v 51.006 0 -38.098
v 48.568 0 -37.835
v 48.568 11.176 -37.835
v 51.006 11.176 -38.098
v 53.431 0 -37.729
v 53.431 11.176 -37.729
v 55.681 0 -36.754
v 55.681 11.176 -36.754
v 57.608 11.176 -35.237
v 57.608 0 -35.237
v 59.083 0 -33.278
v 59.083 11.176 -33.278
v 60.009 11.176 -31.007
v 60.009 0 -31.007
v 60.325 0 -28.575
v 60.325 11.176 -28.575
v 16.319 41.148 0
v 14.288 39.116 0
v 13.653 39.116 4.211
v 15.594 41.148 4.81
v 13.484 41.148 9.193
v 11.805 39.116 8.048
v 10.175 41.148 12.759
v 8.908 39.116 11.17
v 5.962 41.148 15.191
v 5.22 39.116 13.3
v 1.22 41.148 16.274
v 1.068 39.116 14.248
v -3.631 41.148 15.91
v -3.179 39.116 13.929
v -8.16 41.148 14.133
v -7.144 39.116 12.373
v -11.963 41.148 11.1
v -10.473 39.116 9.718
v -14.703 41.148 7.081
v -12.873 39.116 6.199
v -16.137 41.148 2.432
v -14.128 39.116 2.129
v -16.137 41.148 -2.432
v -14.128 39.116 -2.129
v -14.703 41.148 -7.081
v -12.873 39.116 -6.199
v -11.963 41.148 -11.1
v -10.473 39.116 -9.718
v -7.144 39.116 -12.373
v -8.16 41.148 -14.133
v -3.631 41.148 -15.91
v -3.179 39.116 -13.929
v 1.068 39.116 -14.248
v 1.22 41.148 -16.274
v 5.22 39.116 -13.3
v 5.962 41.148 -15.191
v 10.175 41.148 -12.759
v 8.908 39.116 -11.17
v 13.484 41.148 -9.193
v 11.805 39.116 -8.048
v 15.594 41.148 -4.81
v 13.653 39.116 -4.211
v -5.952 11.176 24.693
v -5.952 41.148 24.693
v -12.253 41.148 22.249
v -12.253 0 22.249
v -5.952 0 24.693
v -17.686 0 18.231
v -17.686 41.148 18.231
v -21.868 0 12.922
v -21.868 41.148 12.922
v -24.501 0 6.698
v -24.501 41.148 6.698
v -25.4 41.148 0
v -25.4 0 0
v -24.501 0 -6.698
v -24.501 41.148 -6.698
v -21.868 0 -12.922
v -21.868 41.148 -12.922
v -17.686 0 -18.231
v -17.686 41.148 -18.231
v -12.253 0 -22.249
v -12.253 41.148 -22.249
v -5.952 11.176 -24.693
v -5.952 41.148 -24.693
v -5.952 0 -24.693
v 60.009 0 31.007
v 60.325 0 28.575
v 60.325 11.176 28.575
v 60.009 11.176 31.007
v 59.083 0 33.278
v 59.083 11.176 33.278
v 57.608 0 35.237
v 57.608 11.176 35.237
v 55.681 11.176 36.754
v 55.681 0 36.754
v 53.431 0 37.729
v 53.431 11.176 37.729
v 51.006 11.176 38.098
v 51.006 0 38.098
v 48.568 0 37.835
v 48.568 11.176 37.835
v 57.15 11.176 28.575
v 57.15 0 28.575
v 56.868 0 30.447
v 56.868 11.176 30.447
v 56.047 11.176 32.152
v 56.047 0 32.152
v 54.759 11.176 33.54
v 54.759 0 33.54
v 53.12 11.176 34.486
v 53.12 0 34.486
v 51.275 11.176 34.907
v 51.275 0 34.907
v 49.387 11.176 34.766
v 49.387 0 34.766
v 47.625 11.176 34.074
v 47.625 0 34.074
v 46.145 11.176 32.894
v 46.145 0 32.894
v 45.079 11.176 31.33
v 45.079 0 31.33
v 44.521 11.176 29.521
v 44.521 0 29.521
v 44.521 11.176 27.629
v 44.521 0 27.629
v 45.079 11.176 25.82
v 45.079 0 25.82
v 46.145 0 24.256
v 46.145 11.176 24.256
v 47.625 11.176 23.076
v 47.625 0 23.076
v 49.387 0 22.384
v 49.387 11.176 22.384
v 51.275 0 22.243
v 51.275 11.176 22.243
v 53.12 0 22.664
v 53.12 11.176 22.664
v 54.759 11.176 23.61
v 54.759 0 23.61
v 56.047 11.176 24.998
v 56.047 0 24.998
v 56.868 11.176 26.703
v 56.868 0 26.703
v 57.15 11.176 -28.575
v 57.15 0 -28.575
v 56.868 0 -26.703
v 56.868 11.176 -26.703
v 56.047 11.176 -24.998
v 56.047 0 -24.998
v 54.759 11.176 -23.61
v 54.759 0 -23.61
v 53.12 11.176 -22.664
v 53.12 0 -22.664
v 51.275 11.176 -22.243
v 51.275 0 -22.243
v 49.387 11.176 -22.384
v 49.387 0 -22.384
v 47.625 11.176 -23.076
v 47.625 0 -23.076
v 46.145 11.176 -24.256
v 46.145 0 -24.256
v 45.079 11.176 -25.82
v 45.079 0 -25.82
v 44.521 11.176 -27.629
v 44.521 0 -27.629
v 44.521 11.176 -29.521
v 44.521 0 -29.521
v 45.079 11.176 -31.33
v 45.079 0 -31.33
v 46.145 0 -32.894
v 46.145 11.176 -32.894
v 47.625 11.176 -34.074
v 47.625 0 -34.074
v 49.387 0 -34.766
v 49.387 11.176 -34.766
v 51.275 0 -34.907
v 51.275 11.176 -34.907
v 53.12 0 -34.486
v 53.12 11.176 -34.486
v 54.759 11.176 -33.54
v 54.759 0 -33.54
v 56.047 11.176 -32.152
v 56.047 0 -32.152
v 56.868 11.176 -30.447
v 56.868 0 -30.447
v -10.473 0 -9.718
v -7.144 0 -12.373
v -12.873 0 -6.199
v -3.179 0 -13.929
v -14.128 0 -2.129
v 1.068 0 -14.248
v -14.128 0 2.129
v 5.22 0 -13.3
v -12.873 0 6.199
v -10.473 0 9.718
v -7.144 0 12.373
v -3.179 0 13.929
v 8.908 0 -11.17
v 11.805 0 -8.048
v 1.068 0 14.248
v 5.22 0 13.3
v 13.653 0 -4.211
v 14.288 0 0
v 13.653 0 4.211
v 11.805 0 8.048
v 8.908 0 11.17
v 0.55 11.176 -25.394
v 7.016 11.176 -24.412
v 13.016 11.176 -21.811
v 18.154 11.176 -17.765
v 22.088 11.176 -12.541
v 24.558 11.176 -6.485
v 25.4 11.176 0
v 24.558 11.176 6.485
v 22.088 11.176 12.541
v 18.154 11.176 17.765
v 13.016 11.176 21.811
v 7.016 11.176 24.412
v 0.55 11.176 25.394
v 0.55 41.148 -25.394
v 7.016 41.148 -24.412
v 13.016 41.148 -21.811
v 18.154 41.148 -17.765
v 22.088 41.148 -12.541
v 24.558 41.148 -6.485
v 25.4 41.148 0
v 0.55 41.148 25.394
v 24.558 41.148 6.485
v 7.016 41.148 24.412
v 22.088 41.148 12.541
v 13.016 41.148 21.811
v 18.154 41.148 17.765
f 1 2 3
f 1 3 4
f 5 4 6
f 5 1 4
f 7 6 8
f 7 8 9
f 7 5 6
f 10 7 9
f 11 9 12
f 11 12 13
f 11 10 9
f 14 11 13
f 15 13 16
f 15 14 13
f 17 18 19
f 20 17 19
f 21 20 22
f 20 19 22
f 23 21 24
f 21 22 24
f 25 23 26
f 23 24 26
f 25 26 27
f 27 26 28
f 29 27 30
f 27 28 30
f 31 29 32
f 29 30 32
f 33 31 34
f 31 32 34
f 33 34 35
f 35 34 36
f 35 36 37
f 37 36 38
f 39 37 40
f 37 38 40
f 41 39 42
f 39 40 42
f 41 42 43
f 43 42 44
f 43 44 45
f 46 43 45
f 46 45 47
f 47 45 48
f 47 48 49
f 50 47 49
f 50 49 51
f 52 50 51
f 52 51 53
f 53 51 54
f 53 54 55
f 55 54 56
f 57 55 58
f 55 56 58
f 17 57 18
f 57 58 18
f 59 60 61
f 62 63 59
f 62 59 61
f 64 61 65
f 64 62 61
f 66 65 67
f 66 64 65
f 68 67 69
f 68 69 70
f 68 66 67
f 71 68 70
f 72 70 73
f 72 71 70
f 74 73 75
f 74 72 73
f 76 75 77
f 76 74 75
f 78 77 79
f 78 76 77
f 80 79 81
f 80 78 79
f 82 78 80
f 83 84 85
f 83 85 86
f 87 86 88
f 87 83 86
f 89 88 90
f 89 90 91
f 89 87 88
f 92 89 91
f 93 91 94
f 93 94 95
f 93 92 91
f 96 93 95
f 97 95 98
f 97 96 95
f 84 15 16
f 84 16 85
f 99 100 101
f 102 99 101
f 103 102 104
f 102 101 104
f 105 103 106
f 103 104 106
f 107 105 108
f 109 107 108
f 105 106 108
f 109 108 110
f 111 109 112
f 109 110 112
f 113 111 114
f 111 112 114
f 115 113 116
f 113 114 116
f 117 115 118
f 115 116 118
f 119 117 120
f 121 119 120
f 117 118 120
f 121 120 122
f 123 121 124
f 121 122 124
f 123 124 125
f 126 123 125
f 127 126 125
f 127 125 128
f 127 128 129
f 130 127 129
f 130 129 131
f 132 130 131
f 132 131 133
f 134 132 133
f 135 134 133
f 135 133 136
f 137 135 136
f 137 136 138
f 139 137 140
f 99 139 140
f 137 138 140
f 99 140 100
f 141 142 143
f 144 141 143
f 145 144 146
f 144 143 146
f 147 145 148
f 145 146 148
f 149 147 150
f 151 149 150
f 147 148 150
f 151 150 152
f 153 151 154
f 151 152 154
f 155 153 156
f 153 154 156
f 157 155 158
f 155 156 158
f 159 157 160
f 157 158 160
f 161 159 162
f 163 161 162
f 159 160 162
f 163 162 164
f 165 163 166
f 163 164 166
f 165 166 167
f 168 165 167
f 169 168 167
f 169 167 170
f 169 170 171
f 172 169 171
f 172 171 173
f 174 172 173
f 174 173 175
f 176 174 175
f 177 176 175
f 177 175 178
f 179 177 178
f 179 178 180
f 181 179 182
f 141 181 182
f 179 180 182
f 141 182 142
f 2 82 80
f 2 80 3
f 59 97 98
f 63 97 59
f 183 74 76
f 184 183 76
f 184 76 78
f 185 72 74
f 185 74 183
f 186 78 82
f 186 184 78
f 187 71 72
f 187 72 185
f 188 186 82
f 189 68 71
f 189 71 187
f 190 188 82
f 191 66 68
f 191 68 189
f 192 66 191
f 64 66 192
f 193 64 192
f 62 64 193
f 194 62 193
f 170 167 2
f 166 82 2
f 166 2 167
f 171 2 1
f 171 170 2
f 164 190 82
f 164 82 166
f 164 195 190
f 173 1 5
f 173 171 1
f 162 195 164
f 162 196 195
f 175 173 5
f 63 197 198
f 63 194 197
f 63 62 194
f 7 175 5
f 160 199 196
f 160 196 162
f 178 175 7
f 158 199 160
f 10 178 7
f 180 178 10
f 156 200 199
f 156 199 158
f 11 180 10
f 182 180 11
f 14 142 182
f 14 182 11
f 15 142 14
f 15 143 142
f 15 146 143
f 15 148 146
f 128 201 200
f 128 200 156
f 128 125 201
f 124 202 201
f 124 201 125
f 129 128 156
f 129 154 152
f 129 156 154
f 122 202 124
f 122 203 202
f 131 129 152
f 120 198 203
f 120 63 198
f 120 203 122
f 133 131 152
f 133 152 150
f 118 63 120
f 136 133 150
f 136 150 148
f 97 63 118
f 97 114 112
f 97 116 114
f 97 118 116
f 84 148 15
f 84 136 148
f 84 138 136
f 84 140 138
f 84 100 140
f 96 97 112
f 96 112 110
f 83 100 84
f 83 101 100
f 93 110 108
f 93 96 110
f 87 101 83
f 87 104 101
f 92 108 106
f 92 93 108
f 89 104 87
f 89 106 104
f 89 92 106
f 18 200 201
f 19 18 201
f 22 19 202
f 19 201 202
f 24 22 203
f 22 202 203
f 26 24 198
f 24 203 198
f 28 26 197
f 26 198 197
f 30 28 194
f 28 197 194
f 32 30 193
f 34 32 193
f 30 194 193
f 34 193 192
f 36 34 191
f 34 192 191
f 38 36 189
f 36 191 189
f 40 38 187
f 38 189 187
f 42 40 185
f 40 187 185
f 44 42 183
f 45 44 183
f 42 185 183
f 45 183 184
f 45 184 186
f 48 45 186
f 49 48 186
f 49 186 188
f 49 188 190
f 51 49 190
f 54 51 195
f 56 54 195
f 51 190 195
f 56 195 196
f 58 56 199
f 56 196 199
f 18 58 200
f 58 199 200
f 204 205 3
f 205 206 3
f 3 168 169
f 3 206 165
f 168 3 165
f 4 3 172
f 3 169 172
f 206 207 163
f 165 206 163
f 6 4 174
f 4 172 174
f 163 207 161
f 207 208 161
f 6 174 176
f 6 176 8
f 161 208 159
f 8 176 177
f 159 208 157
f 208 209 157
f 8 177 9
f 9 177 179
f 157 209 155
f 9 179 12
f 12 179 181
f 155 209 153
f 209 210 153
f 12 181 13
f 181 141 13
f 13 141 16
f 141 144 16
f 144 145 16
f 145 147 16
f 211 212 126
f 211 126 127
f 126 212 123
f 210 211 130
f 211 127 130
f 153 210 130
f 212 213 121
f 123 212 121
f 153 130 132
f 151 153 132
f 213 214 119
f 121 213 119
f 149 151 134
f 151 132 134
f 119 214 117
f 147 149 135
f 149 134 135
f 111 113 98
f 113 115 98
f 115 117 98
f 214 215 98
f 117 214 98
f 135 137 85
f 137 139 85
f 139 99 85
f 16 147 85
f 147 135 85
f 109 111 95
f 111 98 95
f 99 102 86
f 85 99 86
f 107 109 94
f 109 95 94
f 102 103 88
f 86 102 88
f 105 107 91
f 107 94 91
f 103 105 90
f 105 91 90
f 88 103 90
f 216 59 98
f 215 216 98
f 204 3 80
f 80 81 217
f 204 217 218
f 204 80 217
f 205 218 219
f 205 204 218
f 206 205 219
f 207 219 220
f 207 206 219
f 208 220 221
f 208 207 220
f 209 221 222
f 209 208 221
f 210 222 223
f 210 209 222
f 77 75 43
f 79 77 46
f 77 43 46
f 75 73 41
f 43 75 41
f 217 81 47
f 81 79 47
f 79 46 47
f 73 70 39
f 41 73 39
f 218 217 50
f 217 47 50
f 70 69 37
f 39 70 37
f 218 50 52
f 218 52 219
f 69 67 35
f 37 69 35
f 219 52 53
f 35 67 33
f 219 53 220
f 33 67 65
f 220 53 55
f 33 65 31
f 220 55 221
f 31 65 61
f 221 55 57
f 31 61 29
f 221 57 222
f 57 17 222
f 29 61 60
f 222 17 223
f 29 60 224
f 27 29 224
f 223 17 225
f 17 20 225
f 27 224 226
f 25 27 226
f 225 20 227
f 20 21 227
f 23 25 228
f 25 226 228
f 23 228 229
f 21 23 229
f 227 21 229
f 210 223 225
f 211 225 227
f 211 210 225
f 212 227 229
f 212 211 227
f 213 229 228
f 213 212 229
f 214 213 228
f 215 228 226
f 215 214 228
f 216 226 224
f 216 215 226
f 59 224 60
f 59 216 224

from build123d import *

# Parameters (mm, degrees)
F0_R        = 14.2875
F1_DEPTH    = 41.148
F0_R_2      = 6.35
F1_FACE_R   = 25.4
F1_FACE_R_2 = 14.2875
F2_DEPTH    = 11.176
F3_SIZE2    = 2.032
F3_SIZE     = 2.032


with BuildPart() as f1:
    # F0 (on Front) → F1 (new body)
    with BuildSketch(Plane.XZ):
        with BuildLine():
            ThreePointArc((-5.9521693415, -24.692745496), (15.7158343515, -19.9542614656), (25.4, 0))
            ThreePointArc((25.4, 0), (15.7158343515, 19.9542614656), (-5.9521693415, 24.692745496))
            ThreePointArc((-5.9521693415, 24.692745496), (-25.4, 0), (-5.9521693415, -24.692745496))
        make_face()
        Circle(F0_R, mode=Mode.SUBTRACT)
    extrude(amount=-F1_DEPTH)

    # F0 (on Front) + F1_face (on face) → F2 (join)
    with BuildSketch(Plane.XZ):
        with BuildLine():
            ThreePointArc((-5.9521693415, -24.692745496), (15.7158343515, -19.9542614656), (25.4, 0))
            ThreePointArc((25.4, 0), (15.7158343515, 19.9542614656), (-5.9521693415, 24.692745496))
            ThreePointArc((-5.9521693415, 24.692745496), (-25.4, 0), (-5.9521693415, -24.692745496))
        make_face()
        Circle(F0_R, mode=Mode.SUBTRACT)
        with BuildLine():
            ThreePointArc((-5.9521693415, 24.692745496), (15.7158343515, 19.9542614656), (25.4, 0))
            ThreePointArc((25.4, 0), (15.7158343515, -19.9542614656), (-5.9521693415, -24.692745496))
            Line((-5.9521693415, -24.692745496), (48.5679364969, -37.834779561))
            ThreePointArc((48.5679364969, -37.834779561), (56.6934378818, -36.0578480496), (60.325, -28.575))
            Line((60.325, -28.575), (60.325, 28.575))
            ThreePointArc((60.325, 28.575), (56.6934378818, 36.0578480496), (48.5679364969, 37.834779561))
            Line((48.5679364969, 37.834779561), (-5.9521693415, 24.692745496))
        make_face()
        with Locations((50.8, -28.575)):
            Circle(F0_R_2, mode=Mode.SUBTRACT)
        with Locations((50.8, 28.575)):
            Circle(F0_R_2, mode=Mode.SUBTRACT)
    with BuildSketch(Plane.XZ):
        Circle(F1_FACE_R)
        Circle(F1_FACE_R_2, mode=Mode.SUBTRACT)
    extrude(amount=-F2_DEPTH)

    # F3
    f3_edges = [f1.edges().sort_by_distance(p)[0] for p in [
        (-14.2875, 41.148, 0),
    ]]
    chamfer(f3_edges, length=F3_SIZE, length2=F3_SIZE2)


solid = f1.part
